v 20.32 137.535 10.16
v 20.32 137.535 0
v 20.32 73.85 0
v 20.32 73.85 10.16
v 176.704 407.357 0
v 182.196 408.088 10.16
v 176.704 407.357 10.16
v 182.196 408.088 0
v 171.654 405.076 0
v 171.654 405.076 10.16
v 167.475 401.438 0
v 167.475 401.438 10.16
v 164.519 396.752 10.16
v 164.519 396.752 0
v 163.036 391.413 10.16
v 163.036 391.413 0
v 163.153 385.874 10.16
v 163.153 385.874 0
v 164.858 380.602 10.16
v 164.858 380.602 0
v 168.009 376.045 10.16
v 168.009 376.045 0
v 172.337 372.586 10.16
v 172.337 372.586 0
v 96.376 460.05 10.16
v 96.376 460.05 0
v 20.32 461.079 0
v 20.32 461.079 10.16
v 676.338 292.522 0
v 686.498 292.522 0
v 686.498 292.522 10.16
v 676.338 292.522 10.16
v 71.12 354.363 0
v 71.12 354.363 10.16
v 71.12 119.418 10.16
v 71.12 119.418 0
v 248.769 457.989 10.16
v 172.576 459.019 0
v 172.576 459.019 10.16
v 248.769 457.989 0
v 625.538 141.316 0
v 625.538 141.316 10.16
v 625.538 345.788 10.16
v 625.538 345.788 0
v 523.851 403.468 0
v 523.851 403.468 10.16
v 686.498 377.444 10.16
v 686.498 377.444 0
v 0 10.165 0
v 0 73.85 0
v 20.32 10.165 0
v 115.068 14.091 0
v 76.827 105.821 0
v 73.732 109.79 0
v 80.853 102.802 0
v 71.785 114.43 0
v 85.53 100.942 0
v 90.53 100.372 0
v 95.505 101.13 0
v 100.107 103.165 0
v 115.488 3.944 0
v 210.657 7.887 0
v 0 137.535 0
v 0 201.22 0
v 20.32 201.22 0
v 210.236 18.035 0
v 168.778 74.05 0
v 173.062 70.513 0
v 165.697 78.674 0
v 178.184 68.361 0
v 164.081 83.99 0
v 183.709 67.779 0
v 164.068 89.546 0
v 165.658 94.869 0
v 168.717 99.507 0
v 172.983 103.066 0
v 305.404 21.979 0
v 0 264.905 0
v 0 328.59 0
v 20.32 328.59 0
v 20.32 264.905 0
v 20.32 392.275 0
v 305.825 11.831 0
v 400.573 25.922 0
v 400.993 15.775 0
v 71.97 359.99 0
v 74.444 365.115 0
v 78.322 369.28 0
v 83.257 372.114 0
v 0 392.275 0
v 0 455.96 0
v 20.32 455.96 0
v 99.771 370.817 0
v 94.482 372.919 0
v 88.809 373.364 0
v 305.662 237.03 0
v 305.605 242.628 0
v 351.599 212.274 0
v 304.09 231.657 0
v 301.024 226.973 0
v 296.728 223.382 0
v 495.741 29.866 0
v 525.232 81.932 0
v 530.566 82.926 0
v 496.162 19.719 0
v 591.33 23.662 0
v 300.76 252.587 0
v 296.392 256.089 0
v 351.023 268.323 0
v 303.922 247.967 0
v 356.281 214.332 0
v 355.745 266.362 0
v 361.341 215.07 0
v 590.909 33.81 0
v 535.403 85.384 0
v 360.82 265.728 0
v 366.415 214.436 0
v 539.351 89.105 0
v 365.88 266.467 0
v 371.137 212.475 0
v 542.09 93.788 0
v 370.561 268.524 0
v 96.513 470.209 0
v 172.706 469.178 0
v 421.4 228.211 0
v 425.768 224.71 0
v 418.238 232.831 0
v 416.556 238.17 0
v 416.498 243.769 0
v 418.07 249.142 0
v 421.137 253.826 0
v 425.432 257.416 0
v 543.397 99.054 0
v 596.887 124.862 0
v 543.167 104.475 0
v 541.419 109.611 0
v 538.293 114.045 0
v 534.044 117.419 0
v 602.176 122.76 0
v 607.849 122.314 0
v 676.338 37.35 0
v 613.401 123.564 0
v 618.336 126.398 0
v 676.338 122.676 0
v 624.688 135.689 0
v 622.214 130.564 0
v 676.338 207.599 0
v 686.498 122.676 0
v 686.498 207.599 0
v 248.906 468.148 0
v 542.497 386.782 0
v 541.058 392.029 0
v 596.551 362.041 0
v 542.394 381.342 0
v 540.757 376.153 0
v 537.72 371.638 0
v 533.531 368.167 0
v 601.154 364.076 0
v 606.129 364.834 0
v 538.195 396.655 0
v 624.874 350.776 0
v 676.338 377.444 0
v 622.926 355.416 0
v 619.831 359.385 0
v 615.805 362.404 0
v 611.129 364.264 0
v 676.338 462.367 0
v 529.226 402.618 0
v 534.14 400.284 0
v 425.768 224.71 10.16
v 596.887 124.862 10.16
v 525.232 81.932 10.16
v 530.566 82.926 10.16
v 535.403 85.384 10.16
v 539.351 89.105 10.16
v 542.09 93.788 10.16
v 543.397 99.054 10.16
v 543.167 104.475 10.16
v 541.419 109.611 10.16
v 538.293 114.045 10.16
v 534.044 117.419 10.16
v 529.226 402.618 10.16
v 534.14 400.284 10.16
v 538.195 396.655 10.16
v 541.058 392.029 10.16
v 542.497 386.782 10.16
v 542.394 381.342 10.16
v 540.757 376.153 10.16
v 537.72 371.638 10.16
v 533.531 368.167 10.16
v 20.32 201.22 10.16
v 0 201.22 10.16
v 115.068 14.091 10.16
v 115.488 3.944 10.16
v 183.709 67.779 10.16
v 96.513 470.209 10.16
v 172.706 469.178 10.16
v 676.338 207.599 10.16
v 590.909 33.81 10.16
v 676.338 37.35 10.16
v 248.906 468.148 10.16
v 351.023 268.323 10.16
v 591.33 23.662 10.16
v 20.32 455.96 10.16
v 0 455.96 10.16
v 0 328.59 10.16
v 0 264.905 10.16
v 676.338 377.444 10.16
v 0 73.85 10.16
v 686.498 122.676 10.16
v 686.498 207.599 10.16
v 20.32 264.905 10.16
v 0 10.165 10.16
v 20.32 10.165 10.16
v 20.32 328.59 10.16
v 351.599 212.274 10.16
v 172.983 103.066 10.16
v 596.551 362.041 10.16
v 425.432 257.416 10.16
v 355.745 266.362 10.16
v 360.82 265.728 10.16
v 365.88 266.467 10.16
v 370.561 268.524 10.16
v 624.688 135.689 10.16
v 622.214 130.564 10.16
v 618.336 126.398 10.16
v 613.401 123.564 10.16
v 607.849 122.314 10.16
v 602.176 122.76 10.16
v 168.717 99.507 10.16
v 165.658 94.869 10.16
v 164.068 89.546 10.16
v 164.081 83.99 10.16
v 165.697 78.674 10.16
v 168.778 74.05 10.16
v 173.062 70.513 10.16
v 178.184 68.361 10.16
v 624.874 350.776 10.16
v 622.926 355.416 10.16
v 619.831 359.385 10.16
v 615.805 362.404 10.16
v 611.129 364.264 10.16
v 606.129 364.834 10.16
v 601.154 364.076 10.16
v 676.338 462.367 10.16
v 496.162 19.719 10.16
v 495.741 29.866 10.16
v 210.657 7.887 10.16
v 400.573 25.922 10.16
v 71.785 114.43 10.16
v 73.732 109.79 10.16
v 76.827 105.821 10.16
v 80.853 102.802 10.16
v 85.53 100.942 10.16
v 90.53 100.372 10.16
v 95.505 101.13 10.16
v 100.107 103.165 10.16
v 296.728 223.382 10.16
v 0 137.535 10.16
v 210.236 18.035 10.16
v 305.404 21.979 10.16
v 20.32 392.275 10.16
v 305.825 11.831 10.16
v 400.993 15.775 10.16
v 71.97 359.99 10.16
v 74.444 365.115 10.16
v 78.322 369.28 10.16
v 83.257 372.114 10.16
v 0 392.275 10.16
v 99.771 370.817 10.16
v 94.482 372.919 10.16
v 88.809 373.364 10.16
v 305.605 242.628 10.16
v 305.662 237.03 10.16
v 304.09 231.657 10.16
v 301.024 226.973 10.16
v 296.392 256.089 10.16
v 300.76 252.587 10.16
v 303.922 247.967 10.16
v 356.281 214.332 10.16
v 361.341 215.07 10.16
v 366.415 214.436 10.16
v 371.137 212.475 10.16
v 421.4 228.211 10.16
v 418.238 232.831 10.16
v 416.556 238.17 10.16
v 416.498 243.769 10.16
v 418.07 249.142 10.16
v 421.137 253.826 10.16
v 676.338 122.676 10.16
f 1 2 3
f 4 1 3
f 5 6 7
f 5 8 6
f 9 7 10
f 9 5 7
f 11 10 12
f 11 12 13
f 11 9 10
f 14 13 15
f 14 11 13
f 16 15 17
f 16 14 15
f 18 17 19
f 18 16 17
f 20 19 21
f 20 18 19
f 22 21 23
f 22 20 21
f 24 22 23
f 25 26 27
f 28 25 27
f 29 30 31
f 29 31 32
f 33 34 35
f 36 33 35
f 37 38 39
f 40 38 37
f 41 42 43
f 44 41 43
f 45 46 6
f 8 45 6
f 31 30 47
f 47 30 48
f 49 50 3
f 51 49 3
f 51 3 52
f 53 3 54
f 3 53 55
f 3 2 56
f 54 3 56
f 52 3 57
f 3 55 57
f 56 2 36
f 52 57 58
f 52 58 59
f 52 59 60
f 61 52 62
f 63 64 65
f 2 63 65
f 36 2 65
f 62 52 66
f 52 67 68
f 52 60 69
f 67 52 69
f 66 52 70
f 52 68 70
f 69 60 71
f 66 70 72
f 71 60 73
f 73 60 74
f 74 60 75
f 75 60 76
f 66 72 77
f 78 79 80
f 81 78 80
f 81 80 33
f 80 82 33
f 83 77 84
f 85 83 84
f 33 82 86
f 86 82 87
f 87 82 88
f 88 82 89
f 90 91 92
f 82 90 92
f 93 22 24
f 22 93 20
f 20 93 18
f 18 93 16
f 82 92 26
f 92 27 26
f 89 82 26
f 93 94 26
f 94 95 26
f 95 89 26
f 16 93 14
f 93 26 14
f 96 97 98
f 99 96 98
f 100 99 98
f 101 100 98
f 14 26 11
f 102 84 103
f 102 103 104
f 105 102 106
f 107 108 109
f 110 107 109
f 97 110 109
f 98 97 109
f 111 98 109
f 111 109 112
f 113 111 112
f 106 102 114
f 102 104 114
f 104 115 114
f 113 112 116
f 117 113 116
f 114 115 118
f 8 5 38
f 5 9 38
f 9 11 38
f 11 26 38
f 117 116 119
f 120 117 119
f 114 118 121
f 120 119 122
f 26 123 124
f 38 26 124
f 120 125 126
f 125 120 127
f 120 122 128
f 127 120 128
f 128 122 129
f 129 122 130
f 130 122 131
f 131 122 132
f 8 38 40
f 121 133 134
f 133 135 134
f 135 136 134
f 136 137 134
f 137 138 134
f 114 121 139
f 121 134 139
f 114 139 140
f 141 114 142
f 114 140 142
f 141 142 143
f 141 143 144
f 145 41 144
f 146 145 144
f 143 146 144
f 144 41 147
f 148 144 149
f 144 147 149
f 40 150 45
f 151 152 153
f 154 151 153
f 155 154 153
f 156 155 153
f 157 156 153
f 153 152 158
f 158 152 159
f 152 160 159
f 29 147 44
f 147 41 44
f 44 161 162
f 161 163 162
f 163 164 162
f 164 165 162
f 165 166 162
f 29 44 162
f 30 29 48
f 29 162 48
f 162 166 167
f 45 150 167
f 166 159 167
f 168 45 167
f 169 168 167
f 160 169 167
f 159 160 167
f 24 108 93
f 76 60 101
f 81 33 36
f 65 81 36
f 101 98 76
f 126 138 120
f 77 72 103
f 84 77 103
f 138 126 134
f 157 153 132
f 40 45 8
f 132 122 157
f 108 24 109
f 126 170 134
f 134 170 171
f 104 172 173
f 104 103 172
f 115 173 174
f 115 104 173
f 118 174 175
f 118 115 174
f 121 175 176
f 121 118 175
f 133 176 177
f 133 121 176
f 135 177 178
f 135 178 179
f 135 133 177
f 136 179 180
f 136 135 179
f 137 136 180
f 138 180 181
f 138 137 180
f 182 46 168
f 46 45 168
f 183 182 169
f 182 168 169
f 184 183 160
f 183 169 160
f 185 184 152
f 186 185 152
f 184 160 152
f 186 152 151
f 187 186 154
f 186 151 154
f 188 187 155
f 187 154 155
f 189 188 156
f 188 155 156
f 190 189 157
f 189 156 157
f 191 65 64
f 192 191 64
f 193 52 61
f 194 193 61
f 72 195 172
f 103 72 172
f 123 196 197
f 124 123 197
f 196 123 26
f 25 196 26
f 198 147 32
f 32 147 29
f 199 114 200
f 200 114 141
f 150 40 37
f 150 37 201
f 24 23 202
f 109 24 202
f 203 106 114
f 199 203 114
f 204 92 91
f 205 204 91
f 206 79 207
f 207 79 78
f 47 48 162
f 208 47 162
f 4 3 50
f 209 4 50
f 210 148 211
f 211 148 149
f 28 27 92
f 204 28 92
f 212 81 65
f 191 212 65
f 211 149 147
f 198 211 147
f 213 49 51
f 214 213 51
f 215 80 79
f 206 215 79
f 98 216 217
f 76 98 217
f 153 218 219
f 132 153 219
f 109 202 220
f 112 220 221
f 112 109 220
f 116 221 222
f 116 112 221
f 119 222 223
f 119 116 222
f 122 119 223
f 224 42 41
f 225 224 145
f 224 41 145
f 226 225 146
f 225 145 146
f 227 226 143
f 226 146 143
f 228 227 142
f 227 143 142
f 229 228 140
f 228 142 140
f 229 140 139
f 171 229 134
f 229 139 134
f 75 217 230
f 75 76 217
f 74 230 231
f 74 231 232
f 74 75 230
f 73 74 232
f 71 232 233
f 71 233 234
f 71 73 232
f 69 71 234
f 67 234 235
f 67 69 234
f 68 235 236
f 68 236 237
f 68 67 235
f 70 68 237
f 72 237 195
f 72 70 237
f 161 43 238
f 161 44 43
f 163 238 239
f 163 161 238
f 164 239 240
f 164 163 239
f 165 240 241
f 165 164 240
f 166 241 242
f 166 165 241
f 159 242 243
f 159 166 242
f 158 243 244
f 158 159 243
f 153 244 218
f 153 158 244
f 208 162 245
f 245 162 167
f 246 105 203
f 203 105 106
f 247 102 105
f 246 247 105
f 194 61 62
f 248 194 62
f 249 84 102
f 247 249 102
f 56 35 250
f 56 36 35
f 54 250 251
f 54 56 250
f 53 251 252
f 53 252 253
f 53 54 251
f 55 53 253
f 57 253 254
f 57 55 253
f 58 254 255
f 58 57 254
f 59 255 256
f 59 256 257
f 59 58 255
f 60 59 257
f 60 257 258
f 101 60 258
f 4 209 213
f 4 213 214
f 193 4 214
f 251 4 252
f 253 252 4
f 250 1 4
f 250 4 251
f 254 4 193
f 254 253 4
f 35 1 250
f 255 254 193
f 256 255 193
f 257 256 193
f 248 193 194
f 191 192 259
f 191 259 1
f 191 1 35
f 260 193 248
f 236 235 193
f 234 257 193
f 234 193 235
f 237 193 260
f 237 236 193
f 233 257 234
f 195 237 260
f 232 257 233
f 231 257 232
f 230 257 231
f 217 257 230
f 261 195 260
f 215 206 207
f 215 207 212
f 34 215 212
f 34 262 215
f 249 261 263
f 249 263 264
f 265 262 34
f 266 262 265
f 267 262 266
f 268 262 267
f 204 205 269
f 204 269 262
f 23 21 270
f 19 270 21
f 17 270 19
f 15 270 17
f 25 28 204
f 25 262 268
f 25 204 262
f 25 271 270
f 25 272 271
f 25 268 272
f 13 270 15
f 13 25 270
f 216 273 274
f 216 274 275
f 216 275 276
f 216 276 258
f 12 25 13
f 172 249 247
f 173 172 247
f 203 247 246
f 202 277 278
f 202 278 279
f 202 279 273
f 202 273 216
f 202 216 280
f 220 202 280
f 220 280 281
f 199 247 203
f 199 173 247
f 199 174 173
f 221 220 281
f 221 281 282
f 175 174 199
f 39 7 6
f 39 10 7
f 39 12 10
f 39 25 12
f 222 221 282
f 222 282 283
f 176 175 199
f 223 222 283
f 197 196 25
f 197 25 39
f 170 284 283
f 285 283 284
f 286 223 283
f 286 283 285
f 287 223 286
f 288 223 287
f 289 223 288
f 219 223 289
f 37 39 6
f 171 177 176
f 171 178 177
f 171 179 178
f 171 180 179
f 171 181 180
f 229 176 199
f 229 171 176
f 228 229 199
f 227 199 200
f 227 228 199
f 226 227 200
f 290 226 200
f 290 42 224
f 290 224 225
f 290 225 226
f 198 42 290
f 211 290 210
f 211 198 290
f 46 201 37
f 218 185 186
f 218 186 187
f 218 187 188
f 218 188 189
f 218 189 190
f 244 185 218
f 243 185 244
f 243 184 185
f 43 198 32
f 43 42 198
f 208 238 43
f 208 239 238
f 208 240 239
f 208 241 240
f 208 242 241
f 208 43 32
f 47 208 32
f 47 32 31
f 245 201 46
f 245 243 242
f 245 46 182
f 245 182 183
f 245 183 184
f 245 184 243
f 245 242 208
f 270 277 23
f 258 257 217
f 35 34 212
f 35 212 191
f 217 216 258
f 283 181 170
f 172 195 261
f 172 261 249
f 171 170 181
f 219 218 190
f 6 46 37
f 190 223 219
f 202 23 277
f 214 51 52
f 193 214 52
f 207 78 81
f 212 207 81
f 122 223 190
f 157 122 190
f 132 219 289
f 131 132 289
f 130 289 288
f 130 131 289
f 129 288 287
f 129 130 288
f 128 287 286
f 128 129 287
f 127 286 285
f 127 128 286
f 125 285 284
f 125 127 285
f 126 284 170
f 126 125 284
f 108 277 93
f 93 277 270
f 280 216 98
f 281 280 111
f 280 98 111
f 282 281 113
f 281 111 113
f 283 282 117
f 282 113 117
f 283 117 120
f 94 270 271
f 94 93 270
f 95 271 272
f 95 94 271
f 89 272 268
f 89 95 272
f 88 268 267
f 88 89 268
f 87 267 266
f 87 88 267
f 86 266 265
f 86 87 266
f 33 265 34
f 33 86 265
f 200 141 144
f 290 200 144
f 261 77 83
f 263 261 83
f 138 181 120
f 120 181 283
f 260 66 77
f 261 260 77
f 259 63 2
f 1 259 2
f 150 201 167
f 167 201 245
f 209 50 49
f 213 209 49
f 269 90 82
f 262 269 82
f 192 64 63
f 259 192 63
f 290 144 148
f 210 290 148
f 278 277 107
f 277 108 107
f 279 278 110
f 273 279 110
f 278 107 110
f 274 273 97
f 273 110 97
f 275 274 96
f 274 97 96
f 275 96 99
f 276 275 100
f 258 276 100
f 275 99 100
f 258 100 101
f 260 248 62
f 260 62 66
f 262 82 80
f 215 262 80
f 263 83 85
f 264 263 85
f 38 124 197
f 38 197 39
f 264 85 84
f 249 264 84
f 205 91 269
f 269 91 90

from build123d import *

# Parameters (mm, degrees)
BOSS_EXTRUDE1_DEPTH = 10.16
CUT_EXTRUDE1_DEPTH  = 11.16
SKETCH4_W           = 129.547530324
SKETCH4_H           = 444.037072
CUT_EXTRUDE3_DEPTH  = 11.16
SKETCH5_W           = 10.16
SKETCH5_H           = 84.922739191
CUT_EXTRUDE5_DEPTH  = 11.16
CUT_EXTRUDE6_DEPTH  = 11.16
CUT_EXTRUDE7_DEPTH  = 11.16
FILLET1_R           = 19.05


with BuildPart() as part:
    # Sketch1 → Boss-Extrude1 (new body)
    with BuildSketch(Plane.XY):
        with BuildLine():
            Line((20.32, 73.849956434), (0, 73.849956434))
            Line((0, 73.849956434), (0, 10.164894956))
            Line((0, 10.164894956), (20.32, 10.164894956))
            Line((20.32, 10.164894956), (115.06781826, 14.091181531))
            Line((115.06781826, 14.091181531), (115.488322648, 3.943711998))
            Line((115.488322648, 3.943711998), (210.656645296, 7.887423995))
            Line((210.656645296, 7.887423995), (210.236140908, 18.034893528))
            Line((210.236140908, 18.034893528), (305.404463556, 21.978605526))
            Line((305.404463556, 21.978605526), (305.824967945, 11.831135993))
            Line((305.824967945, 11.831135993), (400.993290593, 15.77484799))
            Line((400.993290593, 15.77484799), (400.572786204, 25.922317523))
            Line((400.572786204, 25.922317523), (495.741108852, 29.866029521))
            Line((495.741108852, 29.866029521), (496.161613241, 19.718559988))
            Line((496.161613241, 19.718559988), (591.329935889, 23.662271985))
            Line((591.329935889, 23.662271985), (590.909431501, 33.809741518))
            Line((590.909431501, 33.809741518), (686.077754149, 37.753453516))
            Line((686.077754149, 37.753453516), (686.498258538, 27.605983983))
            Line((686.498258538, 27.605983983), (781.666581186, 31.54969598))
            Line((781.666581186, 31.54969598), (781.246076797, 41.697165514))
            Line((781.246076797, 41.697165514), (781.246076797, 471.95159927))
            ThreePointArc((781.246076797, 471.95159927), (401.049995582, 500.057636465), (20.32, 519.645386783))
            Line((20.32, 519.645386783), (20.32, 455.960325305))
            Line((20.32, 455.960325305), (0, 455.960325305))
            Line((0, 455.960325305), (0, 392.275263826))
            Line((0, 392.275263826), (20.32, 392.275263826))
            Line((20.32, 392.275263826), (20.32, 328.590202348))
            Line((20.32, 328.590202348), (0, 328.590202348))
            Line((0, 328.590202348), (0, 264.905140869))
            Line((0, 264.905140869), (20.32, 264.905140869))
            Line((20.32, 264.905140869), (20.32, 201.220079391))
            Line((20.32, 201.220079391), (0, 201.220079391))
            Line((0, 201.220079391), (0, 137.535017912))
            Line((0, 137.535017912), (20.32, 137.535017912))
            Line((20.32, 137.535017912), (20.32, 73.849956434))
        make_face()
    extrude(amount=BOSS_EXTRUDE1_DEPTH)

    # Sketch2 → Cut-Extrude1 (cut, through all)
    with BuildSketch(Plane.XY.offset(10.16)):
        Polygon((20.32, 471.23904919), (781.246076797, 460.948390721), (781.246076797, 535.017906983), (20.32, 535.017906983), align=None)
    extrude(amount=-CUT_EXTRUDE1_DEPTH, mode=Mode.SUBTRACT)

    # Sketch4 → Cut-Extrude3 (cut, through all)
    with BuildSketch(Plane(origin=(0, 0, 0), x_dir=(-1, 0, 0), z_dir=(0, 0, -1))):
        with Locations((-751.2720237, 249.624519983)):
            Rectangle(SKETCH4_W, SKETCH4_H)
    extrude(amount=-CUT_EXTRUDE3_DEPTH, mode=Mode.SUBTRACT)

    # Sketch5 → Cut-Extrude5 (cut, through all)
    with BuildSketch(Plane(origin=(0, 0, 0), x_dir=(-1, 0, 0), z_dir=(0, 0, -1))):
        Polygon((-686.498258538, 122.676192707), (-686.498258538, 37.753453516), (-686.077754149, 37.753453516), (-676.338258538, 37.753453516), (-676.338258538, 122.676192707), align=None)
        with Locations((-681.418258538, 250.060301493)):
            Rectangle(SKETCH5_W, SKETCH5_H)
        Polygon((-686.498258538, 462.229747042), (-686.498258538, 377.444410279), (-676.338258538, 377.444410279), (-676.338258538, 462.367149469), align=None)
        Polygon((-676.338258538, 37.349855295), (-686.077754149, 37.753453516), (-686.498258538, 27.605983983), (-686.498258538, 26.157835014), (-676.338258538, 26.157835014), align=None)
        Polygon((-686.077754149, 37.753453516), (-686.498258538, 37.753453516), (-686.498258538, 27.605983983), align=None)
        Polygon((-676.338258538, 37.753453516), (-686.077754149, 37.753453516), (-676.338258538, 37.349855295), align=None)
    extrude(amount=-CUT_EXTRUDE5_DEPTH, mode=Mode.SUBTRACT)

    # Sketch9 → Cut-Extrude6 (cut, through all)
    with BuildSketch(Plane(origin=(0, 0, 0), x_dir=(-1, 0, 0), z_dir=(0, 0, -1))):
        Polygon((-20.32, 471.23904919), (-96.513032663, 470.208625209), (-96.375655361, 460.050483081), (-20.32, 461.07904919), align=None)
        Polygon((-172.706065326, 469.178201229), (-172.575642513, 459.019038375), (-248.768675144, 457.988612006), (-248.906065326, 468.147683023), align=None)
    extrude(amount=-CUT_EXTRUDE6_DEPTH, mode=Mode.SUBTRACT)

    # Sketch10 → Cut-Extrude7 (cut, through all)
    with BuildSketch(Plane.XY.offset(10.16)):
        Polygon((323.935601866, 240.017050622), (71.12, 387.534451737), (71.12, 85.442182155), align=None)
        Polygon((589.808964313, 402.575610007), (109.816203442, 409.066965371), (360.851868456, 262.588153871), align=None)
        Polygon((625.538258538, 108.14417143), (625.538258538, 379.763841656), (398.224628495, 240.781222682), align=None)
        Polygon((361.308361904, 218.210119433), (110.294706958, 64.736985613), (590.245383478, 84.62582245), align=None)
    extrude(amount=-CUT_EXTRUDE7_DEPTH, mode=Mode.SUBTRACT)

    # Fillet1
    fillet1_edges = [part.edges().sort_by_distance(p)[0] for p in [
        (398.224628495, 240.781222682, 5.08),
        (625.538258538, 379.763841656, 5.08),
        (625.538258538, 108.14417143, 5.08),
        (109.816203442, 409.066965371, 5.08),
        (589.808964313, 402.575610007, 5.08),
        (360.851868456, 262.588153871, 5.08),
        (361.308361904, 218.210119433, 5.08),
        (590.245383478, 84.62582245, 5.08),
        (110.294706958, 64.736985613, 5.08),
        (71.12, 387.534451737, 5.08),
        (323.935601866, 240.017050622, 5.08),
        (71.12, 85.442182155, 5.08),
    ]]
    fillet(fillet1_edges, radius=FILLET1_R)


solid = part.part
